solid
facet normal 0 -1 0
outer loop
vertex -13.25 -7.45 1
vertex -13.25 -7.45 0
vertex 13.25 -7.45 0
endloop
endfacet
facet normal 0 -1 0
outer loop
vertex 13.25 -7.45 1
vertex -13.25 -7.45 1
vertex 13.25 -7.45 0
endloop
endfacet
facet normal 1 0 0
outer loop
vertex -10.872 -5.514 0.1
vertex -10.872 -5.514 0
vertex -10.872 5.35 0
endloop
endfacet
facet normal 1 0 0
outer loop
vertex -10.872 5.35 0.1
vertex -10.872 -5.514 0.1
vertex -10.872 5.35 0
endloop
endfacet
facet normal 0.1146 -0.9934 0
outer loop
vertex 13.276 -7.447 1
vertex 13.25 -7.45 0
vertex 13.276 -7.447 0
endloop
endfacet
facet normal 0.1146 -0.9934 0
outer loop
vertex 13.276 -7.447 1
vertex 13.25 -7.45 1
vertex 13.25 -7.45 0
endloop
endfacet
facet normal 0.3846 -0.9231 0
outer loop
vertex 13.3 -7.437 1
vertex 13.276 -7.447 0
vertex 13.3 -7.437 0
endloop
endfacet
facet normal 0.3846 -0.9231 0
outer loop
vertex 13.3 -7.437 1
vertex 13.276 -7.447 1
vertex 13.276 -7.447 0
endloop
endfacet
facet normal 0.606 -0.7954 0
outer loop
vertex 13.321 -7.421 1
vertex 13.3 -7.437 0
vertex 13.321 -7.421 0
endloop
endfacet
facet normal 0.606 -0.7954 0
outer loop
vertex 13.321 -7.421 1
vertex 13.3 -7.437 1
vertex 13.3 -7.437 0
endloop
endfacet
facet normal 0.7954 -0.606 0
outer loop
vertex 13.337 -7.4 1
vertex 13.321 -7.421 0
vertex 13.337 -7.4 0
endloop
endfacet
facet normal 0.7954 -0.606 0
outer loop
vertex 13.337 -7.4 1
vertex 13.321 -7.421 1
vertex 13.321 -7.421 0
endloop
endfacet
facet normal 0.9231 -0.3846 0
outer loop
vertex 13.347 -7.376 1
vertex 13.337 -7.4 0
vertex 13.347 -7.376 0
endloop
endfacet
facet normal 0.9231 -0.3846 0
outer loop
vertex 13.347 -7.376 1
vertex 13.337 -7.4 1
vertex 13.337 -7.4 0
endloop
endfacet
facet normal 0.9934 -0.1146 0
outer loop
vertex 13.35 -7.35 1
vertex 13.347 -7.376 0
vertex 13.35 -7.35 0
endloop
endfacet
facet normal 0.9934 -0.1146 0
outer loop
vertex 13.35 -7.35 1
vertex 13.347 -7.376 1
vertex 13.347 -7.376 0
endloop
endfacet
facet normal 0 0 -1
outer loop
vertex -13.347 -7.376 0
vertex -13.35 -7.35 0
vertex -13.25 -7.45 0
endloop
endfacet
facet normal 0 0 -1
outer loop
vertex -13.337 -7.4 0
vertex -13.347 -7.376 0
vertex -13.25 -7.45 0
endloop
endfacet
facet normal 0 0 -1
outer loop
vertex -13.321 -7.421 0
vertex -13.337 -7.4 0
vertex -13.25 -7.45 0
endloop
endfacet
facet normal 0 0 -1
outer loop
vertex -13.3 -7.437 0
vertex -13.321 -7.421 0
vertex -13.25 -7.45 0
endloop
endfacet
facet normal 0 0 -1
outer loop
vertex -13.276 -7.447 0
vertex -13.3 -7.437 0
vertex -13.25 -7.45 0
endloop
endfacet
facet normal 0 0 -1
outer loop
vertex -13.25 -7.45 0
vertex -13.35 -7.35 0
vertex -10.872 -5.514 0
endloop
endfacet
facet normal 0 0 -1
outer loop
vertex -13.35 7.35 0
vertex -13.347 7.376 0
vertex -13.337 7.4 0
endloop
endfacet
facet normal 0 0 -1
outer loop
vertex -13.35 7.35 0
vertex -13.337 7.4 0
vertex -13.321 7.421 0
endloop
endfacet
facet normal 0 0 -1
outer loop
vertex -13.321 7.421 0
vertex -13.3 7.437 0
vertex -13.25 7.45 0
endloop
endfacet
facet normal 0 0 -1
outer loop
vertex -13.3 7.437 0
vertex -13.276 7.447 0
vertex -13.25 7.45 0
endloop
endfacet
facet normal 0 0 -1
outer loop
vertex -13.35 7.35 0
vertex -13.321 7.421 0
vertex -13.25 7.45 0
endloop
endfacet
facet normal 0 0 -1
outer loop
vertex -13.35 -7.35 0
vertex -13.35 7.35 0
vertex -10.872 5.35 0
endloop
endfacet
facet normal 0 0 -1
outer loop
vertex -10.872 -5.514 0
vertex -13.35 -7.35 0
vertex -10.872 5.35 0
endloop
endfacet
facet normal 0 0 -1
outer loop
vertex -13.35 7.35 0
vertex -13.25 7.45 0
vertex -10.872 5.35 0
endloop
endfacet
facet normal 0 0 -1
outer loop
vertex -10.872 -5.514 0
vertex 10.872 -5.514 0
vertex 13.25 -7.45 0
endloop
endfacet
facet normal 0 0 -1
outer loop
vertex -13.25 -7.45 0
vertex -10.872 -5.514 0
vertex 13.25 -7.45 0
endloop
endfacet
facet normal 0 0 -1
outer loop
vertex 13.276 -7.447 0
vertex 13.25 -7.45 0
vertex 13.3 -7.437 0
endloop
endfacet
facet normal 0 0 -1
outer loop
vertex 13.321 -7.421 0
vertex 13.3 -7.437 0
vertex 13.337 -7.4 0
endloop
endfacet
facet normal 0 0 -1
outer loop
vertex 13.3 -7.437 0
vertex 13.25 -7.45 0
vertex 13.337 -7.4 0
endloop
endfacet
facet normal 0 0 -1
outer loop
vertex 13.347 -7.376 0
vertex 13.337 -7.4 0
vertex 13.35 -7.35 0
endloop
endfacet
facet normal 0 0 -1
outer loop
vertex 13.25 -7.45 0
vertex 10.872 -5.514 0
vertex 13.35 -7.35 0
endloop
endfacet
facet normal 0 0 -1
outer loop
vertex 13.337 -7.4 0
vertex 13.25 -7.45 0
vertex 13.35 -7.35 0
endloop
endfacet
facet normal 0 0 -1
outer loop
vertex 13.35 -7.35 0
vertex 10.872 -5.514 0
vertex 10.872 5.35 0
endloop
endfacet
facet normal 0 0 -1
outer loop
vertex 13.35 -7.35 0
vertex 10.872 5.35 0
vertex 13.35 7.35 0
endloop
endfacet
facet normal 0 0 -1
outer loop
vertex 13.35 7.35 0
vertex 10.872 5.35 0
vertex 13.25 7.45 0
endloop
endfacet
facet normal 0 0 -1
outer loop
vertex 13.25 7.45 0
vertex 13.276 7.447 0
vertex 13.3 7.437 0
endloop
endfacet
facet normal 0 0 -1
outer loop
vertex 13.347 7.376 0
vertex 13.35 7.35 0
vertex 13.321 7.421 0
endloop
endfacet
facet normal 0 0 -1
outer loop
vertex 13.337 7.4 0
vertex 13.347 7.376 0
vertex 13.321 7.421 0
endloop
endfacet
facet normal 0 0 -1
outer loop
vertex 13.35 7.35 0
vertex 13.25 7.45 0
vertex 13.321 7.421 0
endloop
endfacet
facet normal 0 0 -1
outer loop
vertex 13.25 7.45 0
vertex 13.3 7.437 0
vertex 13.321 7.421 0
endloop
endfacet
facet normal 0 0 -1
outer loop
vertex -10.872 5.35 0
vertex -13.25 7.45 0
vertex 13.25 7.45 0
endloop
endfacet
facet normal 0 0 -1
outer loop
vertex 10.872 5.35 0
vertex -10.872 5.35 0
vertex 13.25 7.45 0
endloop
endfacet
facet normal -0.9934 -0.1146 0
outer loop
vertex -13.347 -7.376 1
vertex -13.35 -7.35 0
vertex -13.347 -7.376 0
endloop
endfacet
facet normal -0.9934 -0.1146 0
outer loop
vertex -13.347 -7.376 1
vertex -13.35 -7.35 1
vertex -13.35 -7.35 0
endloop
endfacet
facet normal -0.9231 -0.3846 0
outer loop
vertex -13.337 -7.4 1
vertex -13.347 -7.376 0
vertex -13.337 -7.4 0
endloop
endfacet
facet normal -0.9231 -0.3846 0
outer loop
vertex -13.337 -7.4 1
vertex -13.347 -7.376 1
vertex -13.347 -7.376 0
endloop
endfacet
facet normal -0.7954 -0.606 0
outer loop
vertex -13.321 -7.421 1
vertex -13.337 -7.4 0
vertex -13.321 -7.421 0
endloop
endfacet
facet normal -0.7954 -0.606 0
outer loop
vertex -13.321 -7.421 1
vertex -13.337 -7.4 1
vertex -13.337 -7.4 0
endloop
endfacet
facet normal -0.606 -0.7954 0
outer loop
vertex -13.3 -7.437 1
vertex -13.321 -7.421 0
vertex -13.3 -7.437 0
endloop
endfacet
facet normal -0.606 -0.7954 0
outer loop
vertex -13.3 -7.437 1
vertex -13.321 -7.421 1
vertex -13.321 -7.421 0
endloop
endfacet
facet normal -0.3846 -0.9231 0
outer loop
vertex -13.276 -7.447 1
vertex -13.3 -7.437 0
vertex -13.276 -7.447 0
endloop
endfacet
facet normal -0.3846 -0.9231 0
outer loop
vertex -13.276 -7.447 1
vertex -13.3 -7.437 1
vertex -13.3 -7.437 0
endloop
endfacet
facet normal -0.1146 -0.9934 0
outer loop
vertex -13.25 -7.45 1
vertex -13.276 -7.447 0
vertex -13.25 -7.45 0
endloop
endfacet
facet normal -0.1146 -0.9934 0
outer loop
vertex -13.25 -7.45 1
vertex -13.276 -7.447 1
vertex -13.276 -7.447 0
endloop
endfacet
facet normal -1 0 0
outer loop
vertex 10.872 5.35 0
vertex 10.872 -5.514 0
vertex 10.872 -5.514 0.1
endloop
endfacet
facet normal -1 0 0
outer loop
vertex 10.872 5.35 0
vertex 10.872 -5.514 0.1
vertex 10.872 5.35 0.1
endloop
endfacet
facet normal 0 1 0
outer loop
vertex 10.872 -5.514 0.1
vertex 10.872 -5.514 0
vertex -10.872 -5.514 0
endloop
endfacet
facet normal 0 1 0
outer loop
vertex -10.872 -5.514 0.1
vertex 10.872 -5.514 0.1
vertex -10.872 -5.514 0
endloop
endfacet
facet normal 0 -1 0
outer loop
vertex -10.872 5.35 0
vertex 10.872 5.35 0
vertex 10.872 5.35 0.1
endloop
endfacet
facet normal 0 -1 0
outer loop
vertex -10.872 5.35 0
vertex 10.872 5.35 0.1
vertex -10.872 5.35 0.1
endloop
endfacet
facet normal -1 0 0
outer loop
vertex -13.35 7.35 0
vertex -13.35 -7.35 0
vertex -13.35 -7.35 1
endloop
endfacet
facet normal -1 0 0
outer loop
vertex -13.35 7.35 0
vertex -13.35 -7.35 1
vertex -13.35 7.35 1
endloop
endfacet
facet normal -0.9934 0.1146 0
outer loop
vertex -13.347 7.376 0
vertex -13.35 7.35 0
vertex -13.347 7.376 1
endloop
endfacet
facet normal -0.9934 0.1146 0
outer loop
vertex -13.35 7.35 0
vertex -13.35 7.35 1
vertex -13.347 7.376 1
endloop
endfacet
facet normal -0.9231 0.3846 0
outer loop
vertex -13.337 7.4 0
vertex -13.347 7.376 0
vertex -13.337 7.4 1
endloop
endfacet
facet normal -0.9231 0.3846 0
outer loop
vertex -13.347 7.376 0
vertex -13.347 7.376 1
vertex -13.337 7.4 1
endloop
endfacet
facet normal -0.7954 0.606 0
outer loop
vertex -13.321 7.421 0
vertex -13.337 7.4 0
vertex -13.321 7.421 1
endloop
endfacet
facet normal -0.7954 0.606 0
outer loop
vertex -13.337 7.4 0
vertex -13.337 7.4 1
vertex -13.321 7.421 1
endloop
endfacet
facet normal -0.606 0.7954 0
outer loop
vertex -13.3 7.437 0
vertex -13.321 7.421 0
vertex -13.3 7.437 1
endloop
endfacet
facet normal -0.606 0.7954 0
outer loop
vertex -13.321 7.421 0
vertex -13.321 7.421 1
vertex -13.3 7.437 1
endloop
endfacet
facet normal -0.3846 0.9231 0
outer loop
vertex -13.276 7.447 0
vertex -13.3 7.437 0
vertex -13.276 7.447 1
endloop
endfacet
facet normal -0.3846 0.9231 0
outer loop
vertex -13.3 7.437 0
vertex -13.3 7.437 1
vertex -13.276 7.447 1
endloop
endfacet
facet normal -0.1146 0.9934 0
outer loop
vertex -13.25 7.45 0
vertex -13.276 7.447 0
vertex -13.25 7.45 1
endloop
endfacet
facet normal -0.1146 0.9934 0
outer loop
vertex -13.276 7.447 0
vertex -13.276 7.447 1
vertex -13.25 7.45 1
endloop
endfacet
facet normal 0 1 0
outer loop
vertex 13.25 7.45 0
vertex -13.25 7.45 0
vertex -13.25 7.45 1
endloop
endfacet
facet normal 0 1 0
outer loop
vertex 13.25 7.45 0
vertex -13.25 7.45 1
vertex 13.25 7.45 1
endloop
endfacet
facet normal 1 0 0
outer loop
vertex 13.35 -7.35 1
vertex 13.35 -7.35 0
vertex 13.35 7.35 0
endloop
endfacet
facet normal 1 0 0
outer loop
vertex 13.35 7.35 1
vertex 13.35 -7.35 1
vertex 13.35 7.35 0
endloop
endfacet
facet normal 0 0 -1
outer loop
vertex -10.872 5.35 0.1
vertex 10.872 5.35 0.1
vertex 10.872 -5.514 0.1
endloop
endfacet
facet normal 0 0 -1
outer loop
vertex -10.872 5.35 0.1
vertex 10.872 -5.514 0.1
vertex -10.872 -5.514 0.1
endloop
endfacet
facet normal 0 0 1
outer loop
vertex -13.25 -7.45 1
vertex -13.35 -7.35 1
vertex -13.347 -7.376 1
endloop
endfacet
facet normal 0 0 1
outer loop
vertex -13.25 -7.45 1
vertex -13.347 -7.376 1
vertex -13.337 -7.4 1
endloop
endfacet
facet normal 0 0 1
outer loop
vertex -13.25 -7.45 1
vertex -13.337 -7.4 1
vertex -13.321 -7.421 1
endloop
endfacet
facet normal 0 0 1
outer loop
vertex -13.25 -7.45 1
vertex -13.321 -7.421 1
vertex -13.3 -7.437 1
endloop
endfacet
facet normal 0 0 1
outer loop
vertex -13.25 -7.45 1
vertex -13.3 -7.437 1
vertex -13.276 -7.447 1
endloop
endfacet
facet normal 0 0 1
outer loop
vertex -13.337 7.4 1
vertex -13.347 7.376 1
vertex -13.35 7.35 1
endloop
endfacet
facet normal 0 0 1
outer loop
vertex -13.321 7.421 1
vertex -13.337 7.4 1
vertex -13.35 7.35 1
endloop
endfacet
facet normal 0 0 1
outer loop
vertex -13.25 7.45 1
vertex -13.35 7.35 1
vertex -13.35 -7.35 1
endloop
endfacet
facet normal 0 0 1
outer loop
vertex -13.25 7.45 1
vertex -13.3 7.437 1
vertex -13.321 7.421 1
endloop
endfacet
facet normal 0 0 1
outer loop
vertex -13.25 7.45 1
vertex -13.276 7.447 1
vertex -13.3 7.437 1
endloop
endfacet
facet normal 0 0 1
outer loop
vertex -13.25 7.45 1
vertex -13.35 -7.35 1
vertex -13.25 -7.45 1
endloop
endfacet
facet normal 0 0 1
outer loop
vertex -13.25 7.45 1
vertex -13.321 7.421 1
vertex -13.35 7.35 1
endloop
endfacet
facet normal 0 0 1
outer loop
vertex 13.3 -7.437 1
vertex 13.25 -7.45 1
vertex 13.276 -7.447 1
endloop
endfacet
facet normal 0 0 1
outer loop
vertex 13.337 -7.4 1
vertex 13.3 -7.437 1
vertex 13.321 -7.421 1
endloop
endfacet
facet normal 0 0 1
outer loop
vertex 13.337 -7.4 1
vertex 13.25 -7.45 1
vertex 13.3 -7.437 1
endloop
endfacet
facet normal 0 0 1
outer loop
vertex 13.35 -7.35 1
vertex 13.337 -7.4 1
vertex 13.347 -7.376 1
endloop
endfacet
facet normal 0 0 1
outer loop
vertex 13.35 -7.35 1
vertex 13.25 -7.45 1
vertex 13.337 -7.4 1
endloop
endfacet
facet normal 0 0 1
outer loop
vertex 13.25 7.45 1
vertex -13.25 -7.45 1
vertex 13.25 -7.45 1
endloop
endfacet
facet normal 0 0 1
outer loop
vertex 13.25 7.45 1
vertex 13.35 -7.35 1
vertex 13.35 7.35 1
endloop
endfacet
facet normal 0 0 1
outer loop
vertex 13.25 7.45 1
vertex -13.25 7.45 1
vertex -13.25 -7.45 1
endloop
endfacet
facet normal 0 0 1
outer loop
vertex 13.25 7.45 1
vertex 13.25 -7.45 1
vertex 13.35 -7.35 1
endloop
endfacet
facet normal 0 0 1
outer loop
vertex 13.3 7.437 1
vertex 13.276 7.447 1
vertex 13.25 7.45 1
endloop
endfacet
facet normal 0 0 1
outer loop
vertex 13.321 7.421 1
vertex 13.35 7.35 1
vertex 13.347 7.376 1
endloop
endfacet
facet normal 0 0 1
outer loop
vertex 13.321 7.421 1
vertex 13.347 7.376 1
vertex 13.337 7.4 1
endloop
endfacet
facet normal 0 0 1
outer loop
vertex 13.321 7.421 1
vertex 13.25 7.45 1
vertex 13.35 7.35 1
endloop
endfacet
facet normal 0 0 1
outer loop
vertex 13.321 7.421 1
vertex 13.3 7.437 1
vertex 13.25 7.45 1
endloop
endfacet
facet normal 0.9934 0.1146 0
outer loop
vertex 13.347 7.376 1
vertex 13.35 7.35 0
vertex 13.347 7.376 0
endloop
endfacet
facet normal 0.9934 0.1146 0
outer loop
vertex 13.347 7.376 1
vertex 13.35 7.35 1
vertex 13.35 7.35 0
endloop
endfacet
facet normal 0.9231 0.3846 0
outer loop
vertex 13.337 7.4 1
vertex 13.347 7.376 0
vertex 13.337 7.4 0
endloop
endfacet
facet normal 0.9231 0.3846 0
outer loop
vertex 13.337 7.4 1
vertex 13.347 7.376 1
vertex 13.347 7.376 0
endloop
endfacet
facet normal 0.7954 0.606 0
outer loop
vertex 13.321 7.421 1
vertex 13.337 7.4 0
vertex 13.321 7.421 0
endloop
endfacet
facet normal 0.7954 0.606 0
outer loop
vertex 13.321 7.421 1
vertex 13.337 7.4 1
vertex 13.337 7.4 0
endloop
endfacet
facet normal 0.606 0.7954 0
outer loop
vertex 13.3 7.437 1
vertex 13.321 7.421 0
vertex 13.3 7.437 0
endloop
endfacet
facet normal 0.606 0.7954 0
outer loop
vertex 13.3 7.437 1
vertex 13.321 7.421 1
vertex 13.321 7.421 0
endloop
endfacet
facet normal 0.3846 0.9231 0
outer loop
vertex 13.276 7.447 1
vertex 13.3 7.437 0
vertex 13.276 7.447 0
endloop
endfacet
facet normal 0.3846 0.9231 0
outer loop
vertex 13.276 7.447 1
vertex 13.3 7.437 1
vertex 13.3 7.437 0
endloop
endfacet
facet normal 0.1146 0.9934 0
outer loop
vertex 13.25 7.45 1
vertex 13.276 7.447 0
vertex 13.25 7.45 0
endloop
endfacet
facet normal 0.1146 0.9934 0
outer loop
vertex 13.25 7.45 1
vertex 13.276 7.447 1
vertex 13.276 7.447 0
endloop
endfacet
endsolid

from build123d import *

# Parameters (mm, degrees)
SKETCH1_W           = 26.7
SKETCH1_H           = 14.9
BOSS_EXTRUDE1_DEPTH = 1
FILLET1_R           = 0.1
SKETCH2_W           = 21.744
SKETCH2_H           = 10.864
CUT_EXTRUDE1_DEPTH  = 0.1


with BuildPart() as part:
    # Sketch1 → Boss-Extrude1 (new body)
    with BuildSketch(Plane.XY):
        Rectangle(SKETCH1_W, SKETCH1_H)
    extrude(amount=BOSS_EXTRUDE1_DEPTH)

    # Fillet1
    fillet1_edges = [part.edges().sort_by_distance(p)[0] for p in [
        (13.35, -7.45, 0.5),
        (-13.35, -7.45, 0.5),
        (-13.35, 7.45, 0.5),
        (13.35, 7.45, 0.5),
    ]]
    fillet(fillet1_edges, radius=FILLET1_R)

    # Sketch2 → Cut-Extrude1 (cut)
    with BuildSketch(Plane(origin=(0, 0, 0), x_dir=(-1, 0, 0), z_dir=(0, 0, -1))):
        with Locations((0, -0.082)):
            Rectangle(SKETCH2_W, SKETCH2_H)
    extrude(amount=-CUT_EXTRUDE1_DEPTH, mode=Mode.SUBTRACT)


solid = part.part
